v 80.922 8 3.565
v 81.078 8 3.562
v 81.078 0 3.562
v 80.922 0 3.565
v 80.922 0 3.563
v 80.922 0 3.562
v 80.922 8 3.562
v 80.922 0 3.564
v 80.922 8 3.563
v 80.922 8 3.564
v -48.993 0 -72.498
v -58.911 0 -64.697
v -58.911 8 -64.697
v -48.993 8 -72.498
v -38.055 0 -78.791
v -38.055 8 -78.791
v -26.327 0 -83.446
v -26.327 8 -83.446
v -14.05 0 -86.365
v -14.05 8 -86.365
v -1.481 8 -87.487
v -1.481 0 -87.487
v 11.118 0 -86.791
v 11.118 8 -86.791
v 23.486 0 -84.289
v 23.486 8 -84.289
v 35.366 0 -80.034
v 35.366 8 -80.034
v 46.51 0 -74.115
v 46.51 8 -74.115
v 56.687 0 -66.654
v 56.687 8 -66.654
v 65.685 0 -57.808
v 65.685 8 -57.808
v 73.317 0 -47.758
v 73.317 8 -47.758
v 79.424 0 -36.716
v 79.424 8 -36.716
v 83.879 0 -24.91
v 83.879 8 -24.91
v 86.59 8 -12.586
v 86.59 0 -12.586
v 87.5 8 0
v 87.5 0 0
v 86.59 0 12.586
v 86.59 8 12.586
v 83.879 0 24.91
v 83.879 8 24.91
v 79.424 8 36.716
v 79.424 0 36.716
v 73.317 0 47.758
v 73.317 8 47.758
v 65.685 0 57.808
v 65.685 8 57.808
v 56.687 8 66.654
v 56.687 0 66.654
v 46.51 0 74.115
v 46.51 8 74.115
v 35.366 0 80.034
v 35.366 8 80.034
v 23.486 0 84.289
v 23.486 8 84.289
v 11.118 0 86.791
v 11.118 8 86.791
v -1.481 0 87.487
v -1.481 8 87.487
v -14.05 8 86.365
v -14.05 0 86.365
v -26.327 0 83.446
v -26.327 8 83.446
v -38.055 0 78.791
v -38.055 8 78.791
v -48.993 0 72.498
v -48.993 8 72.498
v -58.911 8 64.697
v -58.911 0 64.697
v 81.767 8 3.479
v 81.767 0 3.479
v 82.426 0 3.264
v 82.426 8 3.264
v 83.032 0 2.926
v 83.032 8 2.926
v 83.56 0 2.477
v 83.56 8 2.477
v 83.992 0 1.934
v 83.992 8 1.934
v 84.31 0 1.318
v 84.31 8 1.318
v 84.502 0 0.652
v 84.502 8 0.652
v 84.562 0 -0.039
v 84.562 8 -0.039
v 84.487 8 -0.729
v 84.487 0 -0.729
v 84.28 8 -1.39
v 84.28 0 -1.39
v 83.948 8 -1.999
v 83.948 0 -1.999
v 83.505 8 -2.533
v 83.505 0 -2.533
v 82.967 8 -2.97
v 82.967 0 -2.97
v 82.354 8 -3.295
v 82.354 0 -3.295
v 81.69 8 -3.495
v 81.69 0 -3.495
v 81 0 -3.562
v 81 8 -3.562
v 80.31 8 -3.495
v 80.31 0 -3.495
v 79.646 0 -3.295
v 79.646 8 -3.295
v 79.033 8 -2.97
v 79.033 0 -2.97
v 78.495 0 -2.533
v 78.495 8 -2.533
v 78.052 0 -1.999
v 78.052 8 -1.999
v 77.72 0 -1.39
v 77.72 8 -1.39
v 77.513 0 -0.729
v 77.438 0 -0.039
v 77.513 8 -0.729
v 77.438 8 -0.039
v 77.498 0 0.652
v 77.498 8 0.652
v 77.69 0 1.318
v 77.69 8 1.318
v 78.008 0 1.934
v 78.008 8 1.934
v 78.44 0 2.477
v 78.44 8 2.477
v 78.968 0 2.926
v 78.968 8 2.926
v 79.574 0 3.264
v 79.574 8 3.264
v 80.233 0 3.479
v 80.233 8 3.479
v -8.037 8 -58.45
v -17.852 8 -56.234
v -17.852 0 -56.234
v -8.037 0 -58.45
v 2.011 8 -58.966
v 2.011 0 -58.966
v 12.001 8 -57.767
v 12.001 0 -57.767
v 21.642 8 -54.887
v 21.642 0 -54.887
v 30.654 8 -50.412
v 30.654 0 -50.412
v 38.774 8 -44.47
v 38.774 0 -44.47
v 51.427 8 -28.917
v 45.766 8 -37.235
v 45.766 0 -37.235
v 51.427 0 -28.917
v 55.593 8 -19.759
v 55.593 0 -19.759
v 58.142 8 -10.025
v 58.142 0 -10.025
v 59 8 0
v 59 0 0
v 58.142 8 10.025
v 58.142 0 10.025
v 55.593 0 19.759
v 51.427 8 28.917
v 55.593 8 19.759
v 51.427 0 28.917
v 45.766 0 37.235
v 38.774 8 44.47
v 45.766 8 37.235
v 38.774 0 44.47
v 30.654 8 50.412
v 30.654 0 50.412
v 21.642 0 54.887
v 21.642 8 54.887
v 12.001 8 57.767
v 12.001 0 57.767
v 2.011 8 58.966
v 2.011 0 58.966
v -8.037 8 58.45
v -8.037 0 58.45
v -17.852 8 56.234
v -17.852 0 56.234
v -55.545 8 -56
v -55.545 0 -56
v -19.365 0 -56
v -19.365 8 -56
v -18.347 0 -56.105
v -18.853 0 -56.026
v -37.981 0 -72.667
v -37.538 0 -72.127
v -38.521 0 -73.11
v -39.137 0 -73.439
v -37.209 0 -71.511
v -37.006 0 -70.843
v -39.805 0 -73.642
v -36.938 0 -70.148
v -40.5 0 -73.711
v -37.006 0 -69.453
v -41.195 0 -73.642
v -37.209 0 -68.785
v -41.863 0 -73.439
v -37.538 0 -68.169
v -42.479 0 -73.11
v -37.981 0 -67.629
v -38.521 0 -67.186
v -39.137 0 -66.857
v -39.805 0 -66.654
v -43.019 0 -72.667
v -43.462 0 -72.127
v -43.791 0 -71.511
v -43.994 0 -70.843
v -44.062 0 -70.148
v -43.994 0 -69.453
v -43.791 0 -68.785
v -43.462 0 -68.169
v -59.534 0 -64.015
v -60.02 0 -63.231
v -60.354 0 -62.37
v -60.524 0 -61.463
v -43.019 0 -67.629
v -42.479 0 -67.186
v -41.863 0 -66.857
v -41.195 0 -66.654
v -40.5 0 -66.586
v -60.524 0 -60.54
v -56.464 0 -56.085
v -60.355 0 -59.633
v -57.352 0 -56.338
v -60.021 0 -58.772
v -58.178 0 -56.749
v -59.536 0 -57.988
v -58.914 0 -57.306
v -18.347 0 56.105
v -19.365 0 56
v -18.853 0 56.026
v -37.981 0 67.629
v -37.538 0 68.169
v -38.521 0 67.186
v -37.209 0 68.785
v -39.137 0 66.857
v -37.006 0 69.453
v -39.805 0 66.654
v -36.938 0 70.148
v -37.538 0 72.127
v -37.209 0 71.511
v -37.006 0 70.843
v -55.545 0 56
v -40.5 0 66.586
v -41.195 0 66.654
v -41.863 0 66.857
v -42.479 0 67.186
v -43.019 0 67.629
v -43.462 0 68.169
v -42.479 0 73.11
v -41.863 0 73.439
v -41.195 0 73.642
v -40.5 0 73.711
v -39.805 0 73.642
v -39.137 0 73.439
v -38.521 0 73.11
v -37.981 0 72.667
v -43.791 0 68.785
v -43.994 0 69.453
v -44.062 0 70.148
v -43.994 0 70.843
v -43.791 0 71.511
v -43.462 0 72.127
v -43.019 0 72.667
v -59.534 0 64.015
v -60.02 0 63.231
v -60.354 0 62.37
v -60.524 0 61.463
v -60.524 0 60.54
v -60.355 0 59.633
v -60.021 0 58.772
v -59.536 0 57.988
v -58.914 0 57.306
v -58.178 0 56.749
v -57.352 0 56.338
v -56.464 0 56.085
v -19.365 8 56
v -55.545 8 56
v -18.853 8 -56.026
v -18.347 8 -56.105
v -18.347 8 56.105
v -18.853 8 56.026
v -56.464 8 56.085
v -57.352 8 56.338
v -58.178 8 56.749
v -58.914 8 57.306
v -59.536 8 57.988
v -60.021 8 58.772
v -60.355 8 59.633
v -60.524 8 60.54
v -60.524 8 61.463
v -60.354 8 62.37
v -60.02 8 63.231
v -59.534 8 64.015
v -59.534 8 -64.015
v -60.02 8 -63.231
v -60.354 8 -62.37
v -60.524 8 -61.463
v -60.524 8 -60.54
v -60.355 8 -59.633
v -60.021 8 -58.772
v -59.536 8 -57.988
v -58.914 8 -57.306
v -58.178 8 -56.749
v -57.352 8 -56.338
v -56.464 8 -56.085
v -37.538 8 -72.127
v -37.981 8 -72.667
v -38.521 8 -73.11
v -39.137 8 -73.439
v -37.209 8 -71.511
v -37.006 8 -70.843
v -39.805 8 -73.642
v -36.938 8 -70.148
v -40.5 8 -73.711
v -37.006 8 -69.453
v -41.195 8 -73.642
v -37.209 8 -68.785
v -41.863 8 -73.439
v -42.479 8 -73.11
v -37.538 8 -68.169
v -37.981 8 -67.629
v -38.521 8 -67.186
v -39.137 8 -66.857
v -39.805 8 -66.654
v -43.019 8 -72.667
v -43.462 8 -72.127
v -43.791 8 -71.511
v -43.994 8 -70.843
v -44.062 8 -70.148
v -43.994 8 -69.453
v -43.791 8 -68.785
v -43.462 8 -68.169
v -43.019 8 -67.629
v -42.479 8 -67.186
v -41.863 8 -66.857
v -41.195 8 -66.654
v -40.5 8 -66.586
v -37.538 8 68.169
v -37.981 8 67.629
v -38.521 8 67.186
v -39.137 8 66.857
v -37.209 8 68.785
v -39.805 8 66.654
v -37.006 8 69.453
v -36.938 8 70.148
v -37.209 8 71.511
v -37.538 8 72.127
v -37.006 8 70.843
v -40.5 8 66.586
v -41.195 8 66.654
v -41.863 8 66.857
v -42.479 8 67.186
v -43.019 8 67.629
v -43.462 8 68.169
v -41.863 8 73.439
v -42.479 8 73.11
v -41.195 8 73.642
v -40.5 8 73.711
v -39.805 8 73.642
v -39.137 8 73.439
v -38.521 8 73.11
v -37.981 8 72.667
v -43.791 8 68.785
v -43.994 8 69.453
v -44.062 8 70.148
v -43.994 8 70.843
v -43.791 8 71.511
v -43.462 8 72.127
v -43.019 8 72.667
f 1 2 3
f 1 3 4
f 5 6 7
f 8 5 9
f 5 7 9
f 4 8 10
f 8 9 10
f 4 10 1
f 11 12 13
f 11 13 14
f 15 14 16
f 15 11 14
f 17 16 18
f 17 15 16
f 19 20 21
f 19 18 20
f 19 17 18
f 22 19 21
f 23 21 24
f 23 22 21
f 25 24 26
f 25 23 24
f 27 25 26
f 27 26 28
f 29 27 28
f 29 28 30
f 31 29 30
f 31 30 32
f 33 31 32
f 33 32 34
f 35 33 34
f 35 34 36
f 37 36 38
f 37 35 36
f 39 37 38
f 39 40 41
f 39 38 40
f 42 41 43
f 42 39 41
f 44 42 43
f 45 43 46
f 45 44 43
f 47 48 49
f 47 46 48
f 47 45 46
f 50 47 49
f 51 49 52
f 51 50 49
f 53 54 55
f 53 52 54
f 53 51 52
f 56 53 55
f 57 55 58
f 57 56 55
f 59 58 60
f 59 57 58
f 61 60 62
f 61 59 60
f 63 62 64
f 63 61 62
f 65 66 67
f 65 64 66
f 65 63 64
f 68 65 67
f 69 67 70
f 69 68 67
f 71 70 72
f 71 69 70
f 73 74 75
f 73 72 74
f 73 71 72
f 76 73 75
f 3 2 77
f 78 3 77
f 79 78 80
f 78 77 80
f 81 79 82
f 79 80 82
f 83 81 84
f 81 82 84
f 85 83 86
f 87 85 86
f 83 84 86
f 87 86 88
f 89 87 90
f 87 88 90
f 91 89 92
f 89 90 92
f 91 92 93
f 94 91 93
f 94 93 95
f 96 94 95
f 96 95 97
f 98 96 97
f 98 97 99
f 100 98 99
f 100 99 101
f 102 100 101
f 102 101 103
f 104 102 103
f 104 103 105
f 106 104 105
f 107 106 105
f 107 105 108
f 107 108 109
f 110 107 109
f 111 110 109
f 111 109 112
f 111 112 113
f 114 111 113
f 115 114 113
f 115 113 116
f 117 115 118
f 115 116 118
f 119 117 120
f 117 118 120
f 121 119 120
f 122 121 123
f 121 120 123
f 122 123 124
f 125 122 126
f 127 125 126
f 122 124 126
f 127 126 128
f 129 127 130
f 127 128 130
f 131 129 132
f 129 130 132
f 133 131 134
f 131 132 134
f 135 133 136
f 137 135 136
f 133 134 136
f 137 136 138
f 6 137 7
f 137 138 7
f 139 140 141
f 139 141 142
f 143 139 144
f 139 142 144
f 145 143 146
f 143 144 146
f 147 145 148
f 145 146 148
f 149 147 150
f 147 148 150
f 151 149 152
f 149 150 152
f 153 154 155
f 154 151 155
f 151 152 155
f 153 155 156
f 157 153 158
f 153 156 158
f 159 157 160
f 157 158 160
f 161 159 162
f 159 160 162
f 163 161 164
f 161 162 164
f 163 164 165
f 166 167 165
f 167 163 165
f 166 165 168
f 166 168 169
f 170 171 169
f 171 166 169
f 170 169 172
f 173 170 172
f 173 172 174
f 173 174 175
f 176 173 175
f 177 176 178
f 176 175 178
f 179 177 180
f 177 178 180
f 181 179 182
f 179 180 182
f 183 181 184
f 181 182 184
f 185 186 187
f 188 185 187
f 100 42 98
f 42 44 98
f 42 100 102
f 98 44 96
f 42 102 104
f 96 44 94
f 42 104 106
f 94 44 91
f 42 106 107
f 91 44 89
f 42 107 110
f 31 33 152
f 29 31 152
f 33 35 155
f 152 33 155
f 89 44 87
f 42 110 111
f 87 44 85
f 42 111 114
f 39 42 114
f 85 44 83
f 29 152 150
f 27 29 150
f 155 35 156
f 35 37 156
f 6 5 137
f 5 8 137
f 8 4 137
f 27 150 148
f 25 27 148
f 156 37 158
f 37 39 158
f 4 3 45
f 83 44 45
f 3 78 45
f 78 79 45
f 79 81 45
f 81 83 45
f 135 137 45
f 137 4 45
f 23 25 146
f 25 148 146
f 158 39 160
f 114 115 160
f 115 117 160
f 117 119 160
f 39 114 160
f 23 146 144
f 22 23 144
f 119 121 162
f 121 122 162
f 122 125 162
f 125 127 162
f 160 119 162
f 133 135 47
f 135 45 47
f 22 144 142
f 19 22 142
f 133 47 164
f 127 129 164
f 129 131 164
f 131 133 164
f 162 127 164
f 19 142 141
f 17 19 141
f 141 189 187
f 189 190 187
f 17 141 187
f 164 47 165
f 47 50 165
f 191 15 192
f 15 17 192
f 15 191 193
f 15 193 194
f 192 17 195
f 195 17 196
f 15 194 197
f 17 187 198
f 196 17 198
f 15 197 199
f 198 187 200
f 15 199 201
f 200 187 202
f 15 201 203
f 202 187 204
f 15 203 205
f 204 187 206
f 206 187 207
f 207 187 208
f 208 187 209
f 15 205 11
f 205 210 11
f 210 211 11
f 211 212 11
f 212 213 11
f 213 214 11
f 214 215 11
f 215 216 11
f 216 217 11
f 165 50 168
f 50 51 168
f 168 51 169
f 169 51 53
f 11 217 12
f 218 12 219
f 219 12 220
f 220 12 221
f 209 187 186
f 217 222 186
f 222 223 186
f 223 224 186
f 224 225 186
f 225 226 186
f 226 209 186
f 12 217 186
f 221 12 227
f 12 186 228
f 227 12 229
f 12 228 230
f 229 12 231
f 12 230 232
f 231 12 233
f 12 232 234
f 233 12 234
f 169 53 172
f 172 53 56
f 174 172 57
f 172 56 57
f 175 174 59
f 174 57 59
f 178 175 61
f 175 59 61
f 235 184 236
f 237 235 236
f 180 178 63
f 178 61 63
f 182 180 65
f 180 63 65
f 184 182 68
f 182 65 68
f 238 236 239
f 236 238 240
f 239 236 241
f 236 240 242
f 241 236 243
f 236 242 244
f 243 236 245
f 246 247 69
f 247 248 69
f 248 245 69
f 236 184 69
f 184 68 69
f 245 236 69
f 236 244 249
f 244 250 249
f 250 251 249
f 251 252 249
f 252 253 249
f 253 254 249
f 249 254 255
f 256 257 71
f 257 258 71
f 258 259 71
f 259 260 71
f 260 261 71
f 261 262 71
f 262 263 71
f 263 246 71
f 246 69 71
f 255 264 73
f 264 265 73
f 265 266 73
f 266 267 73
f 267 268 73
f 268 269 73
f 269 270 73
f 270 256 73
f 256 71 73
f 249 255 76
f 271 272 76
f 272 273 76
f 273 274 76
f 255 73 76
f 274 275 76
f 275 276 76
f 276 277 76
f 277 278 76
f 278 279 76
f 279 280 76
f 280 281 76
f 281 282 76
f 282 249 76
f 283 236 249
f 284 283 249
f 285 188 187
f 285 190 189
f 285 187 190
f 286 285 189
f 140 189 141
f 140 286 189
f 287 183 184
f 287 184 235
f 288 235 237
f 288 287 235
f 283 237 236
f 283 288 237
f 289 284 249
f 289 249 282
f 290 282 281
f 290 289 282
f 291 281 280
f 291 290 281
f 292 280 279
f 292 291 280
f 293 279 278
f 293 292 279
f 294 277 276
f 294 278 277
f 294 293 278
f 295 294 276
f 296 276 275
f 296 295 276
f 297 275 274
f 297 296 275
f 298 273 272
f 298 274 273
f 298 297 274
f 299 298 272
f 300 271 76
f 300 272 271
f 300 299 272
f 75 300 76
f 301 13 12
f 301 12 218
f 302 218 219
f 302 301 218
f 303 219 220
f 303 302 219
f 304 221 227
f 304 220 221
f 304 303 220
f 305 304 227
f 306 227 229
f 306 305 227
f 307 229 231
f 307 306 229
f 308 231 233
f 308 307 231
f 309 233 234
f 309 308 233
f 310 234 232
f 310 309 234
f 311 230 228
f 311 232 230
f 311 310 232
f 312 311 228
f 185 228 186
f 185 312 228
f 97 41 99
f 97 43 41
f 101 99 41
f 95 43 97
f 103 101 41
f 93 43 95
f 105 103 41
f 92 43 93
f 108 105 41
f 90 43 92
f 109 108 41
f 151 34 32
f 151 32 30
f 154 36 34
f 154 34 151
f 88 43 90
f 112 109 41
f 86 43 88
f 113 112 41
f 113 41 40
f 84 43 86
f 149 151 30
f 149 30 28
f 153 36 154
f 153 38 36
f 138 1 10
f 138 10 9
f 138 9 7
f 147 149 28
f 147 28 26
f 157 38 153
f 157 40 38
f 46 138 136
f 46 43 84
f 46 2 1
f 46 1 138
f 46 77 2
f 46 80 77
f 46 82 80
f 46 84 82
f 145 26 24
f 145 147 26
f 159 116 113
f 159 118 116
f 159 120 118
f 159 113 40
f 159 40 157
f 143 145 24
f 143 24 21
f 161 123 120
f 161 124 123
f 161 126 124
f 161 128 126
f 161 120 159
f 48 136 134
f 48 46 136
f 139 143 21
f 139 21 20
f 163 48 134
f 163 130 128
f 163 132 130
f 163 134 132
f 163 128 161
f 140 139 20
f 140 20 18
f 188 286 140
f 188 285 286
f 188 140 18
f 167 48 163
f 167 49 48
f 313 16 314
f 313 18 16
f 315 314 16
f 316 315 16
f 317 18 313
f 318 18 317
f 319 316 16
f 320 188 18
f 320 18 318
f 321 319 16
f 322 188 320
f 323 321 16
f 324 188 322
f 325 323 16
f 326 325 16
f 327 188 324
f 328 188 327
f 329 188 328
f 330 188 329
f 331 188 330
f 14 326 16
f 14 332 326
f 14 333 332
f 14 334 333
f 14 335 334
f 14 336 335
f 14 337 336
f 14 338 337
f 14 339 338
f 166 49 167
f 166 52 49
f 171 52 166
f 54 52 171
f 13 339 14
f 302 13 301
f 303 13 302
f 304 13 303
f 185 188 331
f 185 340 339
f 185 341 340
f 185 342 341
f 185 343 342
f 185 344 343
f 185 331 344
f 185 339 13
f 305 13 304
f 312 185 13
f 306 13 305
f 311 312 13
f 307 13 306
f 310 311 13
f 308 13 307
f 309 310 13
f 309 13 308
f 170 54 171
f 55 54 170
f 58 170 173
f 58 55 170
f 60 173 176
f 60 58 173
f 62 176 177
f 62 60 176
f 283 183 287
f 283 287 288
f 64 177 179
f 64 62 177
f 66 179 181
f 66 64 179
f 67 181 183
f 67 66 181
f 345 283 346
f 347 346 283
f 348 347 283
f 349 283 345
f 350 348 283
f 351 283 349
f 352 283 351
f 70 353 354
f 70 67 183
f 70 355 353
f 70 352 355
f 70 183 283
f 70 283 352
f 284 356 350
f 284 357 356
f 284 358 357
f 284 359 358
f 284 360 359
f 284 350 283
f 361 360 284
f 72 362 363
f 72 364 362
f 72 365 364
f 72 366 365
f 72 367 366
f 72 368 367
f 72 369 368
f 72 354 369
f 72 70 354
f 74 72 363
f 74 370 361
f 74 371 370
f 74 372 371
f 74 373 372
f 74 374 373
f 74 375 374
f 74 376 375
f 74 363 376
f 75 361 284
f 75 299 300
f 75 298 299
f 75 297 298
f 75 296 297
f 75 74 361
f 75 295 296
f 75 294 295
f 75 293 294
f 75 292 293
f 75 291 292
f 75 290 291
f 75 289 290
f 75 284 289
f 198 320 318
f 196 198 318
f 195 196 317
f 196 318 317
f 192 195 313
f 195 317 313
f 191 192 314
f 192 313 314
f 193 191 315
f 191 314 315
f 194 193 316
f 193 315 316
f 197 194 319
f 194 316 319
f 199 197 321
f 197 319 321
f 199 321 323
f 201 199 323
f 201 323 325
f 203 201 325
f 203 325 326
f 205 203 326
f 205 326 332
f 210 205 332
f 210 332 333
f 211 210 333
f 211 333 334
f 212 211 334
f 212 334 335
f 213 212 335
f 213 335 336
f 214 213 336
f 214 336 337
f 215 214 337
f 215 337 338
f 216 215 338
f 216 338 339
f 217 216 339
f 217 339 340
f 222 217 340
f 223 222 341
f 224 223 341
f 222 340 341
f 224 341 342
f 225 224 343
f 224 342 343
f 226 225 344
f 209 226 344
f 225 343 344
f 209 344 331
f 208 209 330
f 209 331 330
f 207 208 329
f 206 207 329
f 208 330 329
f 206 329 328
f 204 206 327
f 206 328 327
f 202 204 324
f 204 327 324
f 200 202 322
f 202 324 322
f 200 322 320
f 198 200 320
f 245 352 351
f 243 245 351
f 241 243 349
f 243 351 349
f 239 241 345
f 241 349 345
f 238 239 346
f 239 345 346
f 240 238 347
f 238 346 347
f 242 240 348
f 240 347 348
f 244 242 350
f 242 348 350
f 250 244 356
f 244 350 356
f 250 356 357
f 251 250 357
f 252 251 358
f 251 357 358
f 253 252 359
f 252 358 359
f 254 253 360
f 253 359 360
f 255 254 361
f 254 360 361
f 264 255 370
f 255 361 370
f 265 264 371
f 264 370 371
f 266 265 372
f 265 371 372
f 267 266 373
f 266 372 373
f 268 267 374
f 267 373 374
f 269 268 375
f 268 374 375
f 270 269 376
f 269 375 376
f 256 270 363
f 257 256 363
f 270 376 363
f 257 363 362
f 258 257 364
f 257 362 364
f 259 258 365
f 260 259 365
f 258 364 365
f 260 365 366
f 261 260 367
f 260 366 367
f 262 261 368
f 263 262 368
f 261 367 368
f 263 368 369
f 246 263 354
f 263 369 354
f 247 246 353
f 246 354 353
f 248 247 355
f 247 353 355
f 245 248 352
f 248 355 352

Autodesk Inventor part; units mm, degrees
ref_plane "YZ Plane" through (0, 0, 0) normal (1, 0, 0) x (0, 1, 0)
ref_plane "XZ Plane" through (0, 0, 0) normal (0, 1, 0) x (-1, 0, 0)
ref_plane "XY Plane" through (0, 0, 0) normal (0, 0, 1) x (1, 0, 0)
sketch "Sketch1" plane through (0, 0, 0) normal (0, 1, 0) x (-1, 0, 0)
  circle A0 centre (0, 0) radius 59
  circle A1 centre (0, 0) radius 81 construction
  circle A2 centre (0, 0) radius 87.5
  line L0 (90, -56) -> (10, -56)
  line L1 (10, -56) -> (10, 56)
  line L2 (10, 56) -> (90, 56)
  line L3 (90, 56) -> (90, -56)
  line L4 (90, -56) -> (10, 56) construction
  line L5 (10, -56) -> (90, 56) construction
  point P0 (50, 0)
  point P1 (90, 0)
  point P2 (10, 0)
  point P3 (60, -54.4151)
  point P4 (60, 54.4151)
  point P5 (80, 35.4436)
  point P6 (80, -35.4436)
  point P7 (67.2328, 56)
  point P8 (67.2328, -56)
  point P9 (18.5742, 56)
  point P10 (18.5742, -56)
  dimension "d0" = 118
  dimension "d1" = 162
  dimension "d2" = 175
  dimension "d7" = 112
  dimension "d9" = 80
  dimension "d10" = 10
extrude "Extrusion1" add sketch "Sketch1" along normal blind 8 contours A0 L0 A2 L2 picked at (48.009, -59.1067)
fillet "Fillet1" radius 5 4 edges at (-67.2328, 4, -56) (-67.2328, 4, 56) (-18.5742, 4, -56) (-18.5742, 4, 56)
sketch "Sketch2" plane through (0, 8, 0) normal (0, 1, 0) x (1, 0, 0)
  circle A0 centre (0, 0) radius 70.375
  line L0 (-36.4414, 79.1184) -> (-50.2978, 71.1184)
  line L1 (-50.2978, 71.1184) -> (-44.9056, 61.7788)
  arc A1 (-31.0492, 69.7788) -> (-44.9056, 61.7788) centre (0, 0) ccw
  line L2 (-31.0492, 69.7788) -> (-36.4414, 79.1184)
  circle A2 centre (-40.5, 70.1481) radius 3.5625
  circle A3 centre (-40.5, 70.1481) radius 3.5625
  line L3 (86.7392, -8) -> (86.7392, 8)
  line L4 (86.7392, 8) -> (75.9549, 8)
  arc A4 (75.9549, -8) -> (75.9549, 8) centre (0, 0) ccw
  line L5 (75.9549, -8) -> (86.7392, -8)
  arc A5 (80.9215, -3.5651) -> (80.9217, -3.5616) centre (0, 0) ccw
  arc A6 (81.0783, -3.5616) -> (80.9217, -3.5616) centre (81, 0) ccw
  line L6 (81.0783, -3.5616) -> (80.9215, -3.5651)
  line L7 (-50.2978, -71.1184) -> (-36.4414, -79.1184)
  line L8 (-36.4414, -79.1184) -> (-31.0492, -69.7788)
  arc A7 (-44.9056, -61.7788) -> (-31.0492, -69.7788) centre (0, 0) ccw
  line L9 (-44.9056, -61.7788) -> (-50.2978, -71.1184)
  circle A8 centre (-40.5, -70.1481) radius 3.5625
  point P0 (-65.1143, 450.6181)
extrude "Extrusion2" cut sketch "Sketch2" against normal blind 10 contours A2 | A5 A6 L6 | A8
properties part number "Cylinder Segment Holder" material "Acetal Resin, Black"
